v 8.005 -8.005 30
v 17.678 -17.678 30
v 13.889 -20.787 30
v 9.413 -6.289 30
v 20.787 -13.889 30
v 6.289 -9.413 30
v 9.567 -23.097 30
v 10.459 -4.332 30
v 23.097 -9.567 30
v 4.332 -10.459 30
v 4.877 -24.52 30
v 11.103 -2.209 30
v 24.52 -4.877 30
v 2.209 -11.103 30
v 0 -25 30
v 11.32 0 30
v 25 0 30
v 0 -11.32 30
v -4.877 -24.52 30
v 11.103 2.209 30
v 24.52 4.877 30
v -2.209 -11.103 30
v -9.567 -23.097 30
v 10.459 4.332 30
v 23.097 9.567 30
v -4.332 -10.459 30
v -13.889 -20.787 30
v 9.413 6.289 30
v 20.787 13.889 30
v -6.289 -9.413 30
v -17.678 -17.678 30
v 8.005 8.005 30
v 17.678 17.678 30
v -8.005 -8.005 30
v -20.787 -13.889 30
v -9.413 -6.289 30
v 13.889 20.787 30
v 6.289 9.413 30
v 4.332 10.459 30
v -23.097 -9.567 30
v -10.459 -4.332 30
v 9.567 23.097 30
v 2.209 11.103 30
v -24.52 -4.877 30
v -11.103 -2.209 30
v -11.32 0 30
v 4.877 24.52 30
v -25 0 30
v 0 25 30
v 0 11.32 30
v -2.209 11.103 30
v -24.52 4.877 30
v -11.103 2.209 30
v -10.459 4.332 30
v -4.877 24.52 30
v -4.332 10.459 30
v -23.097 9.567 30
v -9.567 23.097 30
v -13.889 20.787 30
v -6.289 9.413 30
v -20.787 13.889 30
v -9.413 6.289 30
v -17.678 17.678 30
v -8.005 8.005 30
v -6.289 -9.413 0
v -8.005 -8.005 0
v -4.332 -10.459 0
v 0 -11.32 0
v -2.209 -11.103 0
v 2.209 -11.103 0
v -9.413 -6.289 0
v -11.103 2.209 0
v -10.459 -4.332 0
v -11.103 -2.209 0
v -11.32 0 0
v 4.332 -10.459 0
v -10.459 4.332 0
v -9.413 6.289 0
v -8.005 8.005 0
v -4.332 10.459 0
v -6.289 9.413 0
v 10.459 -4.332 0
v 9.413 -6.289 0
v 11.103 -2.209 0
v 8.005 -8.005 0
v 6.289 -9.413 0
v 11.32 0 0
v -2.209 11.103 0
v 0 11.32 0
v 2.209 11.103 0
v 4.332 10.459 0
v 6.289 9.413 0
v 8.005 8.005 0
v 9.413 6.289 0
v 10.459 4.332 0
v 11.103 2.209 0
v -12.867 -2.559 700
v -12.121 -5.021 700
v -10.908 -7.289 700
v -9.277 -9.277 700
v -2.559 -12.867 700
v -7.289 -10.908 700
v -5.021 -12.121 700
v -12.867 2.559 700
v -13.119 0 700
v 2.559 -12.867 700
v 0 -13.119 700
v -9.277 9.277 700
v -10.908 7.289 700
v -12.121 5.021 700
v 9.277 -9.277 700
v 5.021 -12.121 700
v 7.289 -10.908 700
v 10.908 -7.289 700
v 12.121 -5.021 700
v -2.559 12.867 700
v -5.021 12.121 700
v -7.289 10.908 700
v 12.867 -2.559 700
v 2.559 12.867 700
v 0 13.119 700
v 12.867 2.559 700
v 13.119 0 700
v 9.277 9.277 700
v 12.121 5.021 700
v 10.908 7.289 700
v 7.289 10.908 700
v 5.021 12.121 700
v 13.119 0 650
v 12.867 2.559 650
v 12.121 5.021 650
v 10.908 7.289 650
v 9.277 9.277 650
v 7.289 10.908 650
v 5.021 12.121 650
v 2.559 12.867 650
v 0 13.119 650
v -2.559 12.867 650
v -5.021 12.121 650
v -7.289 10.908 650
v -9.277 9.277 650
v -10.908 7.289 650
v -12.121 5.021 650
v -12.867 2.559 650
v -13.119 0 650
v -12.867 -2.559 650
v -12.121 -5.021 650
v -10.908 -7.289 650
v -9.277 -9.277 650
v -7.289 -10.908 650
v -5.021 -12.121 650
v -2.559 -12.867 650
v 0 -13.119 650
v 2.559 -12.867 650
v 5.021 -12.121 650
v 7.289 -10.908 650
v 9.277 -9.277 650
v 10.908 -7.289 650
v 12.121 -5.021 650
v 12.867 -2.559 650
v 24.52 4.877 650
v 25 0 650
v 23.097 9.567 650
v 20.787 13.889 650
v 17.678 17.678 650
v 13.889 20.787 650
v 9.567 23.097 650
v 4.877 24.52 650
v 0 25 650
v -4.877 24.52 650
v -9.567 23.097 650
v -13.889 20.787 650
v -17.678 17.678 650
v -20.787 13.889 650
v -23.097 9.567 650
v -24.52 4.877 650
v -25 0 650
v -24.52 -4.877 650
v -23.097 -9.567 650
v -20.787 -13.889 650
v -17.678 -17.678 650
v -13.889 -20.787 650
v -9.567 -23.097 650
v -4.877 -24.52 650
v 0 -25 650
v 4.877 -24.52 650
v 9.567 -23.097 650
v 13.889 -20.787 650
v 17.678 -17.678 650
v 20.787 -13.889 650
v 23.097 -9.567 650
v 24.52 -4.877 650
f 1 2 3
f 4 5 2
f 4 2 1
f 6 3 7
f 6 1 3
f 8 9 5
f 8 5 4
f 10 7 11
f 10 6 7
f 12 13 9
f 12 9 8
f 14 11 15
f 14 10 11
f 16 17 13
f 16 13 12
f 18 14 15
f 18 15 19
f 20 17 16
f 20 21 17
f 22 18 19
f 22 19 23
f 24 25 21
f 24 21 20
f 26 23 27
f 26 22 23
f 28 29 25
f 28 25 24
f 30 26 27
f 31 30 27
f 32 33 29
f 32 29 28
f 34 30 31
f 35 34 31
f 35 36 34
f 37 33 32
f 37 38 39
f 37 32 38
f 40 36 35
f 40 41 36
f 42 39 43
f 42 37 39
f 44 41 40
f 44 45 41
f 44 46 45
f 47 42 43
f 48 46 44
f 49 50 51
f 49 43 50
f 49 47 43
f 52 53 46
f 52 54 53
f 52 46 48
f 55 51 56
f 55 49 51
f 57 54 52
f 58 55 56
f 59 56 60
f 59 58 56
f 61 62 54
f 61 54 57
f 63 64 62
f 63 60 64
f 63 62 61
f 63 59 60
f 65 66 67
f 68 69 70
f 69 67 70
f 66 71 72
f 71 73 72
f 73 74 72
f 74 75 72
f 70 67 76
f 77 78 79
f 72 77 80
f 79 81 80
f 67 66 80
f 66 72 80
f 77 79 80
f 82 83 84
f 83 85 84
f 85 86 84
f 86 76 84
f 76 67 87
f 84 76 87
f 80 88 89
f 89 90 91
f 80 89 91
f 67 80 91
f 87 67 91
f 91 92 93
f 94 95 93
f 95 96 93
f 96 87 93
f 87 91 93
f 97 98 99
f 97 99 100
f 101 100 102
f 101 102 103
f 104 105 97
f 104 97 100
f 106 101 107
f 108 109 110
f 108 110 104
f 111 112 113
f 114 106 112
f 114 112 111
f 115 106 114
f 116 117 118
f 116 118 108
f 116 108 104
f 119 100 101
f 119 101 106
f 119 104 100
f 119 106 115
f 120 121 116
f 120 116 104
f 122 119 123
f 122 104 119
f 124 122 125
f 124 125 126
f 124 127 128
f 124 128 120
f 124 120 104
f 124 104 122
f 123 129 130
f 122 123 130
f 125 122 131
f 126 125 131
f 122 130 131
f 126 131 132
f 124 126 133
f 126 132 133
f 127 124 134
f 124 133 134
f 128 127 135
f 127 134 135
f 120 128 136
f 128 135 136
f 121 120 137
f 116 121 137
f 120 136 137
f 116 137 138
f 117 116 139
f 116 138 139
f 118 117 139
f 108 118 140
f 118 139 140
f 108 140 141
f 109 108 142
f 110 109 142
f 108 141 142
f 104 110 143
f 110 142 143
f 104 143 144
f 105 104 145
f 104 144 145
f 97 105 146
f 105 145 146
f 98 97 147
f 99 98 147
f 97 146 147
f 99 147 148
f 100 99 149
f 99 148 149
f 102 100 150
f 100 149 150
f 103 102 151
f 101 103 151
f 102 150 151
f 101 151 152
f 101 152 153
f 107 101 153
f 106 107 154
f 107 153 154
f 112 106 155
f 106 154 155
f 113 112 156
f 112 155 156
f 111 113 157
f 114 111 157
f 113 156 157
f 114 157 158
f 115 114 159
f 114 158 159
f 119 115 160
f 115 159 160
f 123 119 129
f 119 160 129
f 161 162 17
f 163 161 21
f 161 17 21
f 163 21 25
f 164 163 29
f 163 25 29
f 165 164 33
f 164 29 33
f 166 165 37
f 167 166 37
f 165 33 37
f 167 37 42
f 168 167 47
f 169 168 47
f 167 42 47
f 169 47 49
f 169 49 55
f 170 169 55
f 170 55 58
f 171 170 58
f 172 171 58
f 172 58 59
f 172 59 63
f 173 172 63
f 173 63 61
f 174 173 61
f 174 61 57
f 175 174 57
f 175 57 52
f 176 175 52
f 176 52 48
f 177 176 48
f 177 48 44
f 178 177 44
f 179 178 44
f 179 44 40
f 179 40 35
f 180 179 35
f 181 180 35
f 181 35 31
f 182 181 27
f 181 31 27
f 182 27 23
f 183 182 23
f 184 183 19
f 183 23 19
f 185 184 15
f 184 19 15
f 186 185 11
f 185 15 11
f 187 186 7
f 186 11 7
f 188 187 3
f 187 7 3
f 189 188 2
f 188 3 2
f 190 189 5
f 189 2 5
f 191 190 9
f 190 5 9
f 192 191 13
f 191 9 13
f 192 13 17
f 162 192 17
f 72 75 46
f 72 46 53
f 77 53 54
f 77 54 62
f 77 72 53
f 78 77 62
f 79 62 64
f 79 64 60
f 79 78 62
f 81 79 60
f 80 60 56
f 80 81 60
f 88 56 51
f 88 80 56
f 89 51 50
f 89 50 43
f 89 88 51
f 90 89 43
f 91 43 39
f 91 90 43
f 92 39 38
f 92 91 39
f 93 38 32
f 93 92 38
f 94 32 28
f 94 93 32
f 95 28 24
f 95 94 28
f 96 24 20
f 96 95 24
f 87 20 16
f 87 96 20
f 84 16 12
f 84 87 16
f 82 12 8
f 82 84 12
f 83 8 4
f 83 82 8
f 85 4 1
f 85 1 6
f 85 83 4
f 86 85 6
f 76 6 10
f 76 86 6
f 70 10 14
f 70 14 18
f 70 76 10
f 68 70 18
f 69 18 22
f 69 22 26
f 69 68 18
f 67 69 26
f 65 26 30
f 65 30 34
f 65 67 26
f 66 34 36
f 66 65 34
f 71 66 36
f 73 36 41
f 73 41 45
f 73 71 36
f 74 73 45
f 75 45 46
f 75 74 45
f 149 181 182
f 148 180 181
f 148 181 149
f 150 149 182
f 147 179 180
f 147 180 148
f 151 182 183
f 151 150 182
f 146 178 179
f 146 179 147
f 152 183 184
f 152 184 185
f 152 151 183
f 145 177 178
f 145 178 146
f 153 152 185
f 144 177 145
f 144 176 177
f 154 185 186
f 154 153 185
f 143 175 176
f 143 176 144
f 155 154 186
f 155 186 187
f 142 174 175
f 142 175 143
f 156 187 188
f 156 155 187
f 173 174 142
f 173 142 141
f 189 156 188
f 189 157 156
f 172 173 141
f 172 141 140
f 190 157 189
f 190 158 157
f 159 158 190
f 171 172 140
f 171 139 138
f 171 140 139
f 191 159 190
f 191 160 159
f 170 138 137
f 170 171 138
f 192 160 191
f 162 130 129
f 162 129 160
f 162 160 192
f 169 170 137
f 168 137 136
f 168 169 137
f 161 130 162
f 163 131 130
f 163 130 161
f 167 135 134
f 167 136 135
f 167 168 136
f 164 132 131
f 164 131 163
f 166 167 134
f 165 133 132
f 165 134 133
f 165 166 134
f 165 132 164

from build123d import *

# Parameters (mm, degrees)
SKETCH1_R           = 25
BOSS_EXTRUDE1_DEPTH = 700
CUT_EXTRUDE1_START  = -50
SKETCH2_R           = 25
SKETCH2_R_2         = 13.119240587
CUT_EXTRUDE1_DEPTH  = 50
SKETCH3_R           = 25
SKETCH3_R_2         = 11.320441419
CUT_EXTRUDE2_DEPTH  = 30


with BuildPart() as part:
    # Sketch1 → Boss-Extrude1 (new body)
    with BuildSketch(Plane.XY):
        Circle(SKETCH1_R)
    extrude(amount=BOSS_EXTRUDE1_DEPTH)

    # Sketch2 → Cut-Extrude1 (cut)
    with BuildSketch(Plane.XY.offset(700).offset(CUT_EXTRUDE1_START)):
        Circle(SKETCH2_R)
        Circle(SKETCH2_R_2, mode=Mode.SUBTRACT)
    extrude(amount=CUT_EXTRUDE1_DEPTH, mode=Mode.SUBTRACT)

    # Sketch3 → Cut-Extrude2 (cut)
    with BuildSketch(Plane(origin=(0, 0, 0), x_dir=(-1, 0, 0), z_dir=(0, 0, -1))):
        Circle(SKETCH3_R)
        Circle(SKETCH3_R_2, mode=Mode.SUBTRACT)
    extrude(amount=-CUT_EXTRUDE2_DEPTH, mode=Mode.SUBTRACT)


solid = part.part
